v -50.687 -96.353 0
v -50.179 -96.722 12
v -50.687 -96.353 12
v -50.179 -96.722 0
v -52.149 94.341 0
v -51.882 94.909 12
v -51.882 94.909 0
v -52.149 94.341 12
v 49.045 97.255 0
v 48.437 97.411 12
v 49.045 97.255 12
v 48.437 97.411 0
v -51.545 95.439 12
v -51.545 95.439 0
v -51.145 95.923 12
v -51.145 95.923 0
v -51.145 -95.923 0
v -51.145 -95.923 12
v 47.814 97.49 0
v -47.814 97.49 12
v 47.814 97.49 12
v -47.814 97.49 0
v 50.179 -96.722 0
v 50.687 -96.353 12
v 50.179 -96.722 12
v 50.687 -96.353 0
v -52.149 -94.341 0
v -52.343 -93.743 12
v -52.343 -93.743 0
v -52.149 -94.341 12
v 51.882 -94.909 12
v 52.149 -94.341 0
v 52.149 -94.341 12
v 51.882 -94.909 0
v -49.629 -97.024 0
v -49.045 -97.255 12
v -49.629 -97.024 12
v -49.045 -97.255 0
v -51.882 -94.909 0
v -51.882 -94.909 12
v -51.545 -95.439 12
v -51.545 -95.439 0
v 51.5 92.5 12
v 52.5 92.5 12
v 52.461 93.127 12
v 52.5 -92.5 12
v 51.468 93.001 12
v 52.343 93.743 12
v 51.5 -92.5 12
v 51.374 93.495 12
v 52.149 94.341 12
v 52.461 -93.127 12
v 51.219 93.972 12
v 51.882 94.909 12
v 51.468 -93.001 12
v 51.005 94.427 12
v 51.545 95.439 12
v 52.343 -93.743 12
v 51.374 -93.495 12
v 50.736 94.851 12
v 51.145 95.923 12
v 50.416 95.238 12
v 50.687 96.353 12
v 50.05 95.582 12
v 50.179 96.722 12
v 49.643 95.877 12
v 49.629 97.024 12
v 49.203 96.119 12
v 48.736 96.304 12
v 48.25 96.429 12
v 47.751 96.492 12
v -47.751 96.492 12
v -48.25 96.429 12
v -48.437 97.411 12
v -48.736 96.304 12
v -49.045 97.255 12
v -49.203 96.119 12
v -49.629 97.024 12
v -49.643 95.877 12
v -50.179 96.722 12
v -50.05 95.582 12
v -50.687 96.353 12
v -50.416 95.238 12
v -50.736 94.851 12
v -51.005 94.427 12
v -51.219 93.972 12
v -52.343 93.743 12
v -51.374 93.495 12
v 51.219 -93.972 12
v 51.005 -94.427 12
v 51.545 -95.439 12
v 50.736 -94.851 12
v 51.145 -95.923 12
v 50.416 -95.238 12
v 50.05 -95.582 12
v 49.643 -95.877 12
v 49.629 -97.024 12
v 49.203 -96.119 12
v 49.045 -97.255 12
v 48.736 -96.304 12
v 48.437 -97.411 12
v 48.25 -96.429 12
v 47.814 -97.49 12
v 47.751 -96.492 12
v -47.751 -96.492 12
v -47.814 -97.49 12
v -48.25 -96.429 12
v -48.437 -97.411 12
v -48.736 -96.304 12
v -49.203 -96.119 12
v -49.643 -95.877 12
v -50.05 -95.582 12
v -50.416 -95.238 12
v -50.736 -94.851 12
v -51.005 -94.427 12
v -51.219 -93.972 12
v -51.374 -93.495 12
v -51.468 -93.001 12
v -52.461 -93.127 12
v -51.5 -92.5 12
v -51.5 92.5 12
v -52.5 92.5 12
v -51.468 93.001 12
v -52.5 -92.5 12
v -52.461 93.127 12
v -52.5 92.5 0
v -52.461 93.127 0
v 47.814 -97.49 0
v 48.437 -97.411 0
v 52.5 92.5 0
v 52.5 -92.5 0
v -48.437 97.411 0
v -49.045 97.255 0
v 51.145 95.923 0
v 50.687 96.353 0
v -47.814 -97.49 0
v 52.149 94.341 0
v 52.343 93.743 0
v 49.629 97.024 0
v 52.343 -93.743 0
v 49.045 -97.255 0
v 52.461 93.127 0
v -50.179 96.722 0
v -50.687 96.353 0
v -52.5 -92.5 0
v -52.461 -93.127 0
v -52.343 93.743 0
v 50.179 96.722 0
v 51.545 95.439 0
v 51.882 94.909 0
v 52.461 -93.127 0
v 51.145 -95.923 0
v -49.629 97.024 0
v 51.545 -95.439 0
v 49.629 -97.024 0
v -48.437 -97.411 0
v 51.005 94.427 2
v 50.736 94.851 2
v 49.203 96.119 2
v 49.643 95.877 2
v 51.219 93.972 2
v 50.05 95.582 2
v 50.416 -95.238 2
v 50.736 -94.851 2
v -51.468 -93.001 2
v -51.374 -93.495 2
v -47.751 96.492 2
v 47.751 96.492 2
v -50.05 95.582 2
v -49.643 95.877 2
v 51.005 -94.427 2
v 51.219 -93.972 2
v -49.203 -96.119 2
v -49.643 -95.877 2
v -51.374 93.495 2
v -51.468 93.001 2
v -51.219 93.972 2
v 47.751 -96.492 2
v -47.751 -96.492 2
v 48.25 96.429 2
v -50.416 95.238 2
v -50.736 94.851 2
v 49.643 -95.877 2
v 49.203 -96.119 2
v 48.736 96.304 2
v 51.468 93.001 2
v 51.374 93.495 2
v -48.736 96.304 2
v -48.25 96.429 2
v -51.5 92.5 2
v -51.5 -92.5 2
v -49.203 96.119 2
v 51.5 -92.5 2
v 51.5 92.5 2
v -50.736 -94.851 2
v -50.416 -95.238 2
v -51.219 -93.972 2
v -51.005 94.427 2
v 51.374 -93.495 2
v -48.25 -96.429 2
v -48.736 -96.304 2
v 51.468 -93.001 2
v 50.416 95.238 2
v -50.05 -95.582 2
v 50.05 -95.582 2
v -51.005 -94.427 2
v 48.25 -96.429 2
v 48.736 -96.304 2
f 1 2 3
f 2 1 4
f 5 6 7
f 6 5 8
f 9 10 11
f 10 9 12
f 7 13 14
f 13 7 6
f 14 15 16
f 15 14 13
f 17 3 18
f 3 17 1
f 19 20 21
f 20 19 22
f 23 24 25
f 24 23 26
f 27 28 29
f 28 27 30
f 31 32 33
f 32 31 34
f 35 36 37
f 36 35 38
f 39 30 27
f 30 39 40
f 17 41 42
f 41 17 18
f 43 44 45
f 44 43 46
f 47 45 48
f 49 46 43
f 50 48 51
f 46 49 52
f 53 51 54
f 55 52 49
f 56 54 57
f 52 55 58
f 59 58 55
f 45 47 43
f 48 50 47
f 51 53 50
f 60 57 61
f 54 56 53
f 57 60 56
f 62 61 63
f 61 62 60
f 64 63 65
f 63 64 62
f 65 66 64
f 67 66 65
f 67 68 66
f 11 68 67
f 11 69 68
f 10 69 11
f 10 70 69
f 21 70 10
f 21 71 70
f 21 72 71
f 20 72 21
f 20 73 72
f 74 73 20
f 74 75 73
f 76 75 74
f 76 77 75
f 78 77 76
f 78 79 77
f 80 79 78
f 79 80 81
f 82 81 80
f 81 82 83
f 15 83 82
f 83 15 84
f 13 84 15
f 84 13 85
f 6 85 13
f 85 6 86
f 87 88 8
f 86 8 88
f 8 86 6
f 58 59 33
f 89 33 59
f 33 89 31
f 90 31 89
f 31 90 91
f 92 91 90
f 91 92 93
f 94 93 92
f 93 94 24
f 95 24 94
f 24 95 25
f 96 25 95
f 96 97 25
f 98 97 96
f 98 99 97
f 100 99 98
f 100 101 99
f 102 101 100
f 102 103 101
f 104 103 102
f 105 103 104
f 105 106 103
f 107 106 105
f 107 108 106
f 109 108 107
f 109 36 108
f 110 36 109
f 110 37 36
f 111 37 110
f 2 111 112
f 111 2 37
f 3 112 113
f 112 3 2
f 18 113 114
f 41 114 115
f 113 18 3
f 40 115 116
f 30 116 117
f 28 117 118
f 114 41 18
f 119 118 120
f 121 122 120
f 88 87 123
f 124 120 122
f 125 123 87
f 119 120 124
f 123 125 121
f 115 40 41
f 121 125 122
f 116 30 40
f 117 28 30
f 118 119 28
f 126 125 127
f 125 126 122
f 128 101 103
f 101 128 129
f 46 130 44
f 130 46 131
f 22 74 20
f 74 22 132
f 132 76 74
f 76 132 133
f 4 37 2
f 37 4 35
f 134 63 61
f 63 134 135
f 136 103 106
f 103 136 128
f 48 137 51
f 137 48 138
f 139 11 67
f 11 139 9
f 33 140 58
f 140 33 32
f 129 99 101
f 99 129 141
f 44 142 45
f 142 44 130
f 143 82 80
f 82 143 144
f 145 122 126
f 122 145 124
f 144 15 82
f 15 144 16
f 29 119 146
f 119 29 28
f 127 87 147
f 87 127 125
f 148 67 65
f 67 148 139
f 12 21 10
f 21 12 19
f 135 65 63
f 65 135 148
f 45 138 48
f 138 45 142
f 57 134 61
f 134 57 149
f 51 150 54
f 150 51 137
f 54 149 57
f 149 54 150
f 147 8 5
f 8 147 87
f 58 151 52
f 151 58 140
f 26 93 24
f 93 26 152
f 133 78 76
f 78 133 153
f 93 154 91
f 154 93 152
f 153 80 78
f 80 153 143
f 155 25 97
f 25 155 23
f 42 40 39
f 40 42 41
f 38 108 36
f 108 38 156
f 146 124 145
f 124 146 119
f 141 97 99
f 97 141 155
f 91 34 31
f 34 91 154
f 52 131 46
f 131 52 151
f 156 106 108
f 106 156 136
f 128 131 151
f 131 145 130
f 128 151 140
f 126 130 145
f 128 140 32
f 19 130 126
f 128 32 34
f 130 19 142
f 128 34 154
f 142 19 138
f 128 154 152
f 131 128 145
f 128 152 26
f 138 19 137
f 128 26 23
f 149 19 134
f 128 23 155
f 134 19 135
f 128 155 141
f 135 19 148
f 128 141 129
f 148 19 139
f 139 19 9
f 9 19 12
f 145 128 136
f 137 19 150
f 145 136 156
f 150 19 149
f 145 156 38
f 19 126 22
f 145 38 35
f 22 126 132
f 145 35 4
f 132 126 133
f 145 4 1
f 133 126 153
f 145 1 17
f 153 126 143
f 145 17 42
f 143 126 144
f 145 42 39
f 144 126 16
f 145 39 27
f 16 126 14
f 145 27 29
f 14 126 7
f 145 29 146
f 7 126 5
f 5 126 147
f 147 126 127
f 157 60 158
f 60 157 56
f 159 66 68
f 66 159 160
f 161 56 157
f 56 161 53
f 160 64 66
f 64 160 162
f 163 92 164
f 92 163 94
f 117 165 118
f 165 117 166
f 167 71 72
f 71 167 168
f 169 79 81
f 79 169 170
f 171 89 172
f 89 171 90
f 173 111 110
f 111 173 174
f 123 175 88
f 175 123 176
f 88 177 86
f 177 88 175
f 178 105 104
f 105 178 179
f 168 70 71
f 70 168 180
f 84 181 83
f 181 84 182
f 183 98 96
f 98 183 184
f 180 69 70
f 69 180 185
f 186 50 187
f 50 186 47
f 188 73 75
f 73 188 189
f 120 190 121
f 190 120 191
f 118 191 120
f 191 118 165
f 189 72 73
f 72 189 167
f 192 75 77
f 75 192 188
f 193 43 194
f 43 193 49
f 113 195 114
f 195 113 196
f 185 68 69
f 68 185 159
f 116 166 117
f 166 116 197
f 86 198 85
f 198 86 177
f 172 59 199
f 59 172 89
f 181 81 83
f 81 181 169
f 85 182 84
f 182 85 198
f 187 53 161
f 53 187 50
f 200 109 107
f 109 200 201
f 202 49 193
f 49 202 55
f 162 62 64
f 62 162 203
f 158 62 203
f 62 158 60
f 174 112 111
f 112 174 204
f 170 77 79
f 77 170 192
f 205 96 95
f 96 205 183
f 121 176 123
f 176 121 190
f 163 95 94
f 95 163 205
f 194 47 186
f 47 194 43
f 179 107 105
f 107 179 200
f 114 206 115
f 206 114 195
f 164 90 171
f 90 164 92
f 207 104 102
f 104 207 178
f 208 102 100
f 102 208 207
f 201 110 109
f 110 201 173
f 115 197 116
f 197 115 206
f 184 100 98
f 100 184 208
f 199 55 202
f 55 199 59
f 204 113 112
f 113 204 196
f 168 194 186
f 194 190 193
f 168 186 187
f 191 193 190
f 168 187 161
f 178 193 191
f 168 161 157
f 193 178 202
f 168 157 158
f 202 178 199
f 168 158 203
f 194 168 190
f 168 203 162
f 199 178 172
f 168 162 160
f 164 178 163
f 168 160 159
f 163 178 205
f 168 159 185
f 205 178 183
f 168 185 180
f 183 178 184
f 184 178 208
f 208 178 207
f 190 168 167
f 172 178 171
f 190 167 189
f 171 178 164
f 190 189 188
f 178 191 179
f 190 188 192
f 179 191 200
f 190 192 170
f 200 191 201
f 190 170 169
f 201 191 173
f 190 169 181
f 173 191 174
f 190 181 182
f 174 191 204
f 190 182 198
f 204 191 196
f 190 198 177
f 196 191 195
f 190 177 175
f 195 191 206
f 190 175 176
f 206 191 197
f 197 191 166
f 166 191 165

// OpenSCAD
$fn = 50;


difference() {
	union() {
		hull() {
			translate(v = [-47.5000000000, 92.5000000000, 0]) {
				cylinder(h = 12, r = 5);
			}
			translate(v = [47.5000000000, 92.5000000000, 0]) {
				cylinder(h = 12, r = 5);
			}
			translate(v = [-47.5000000000, -92.5000000000, 0]) {
				cylinder(h = 12, r = 5);
			}
			translate(v = [47.5000000000, -92.5000000000, 0]) {
				cylinder(h = 12, r = 5);
			}
		}
	}
	union() {
		translate(v = [0, 0, 2]) {
			hull() {
				translate(v = [-47.5000000000, 92.5000000000, 0]) {
					cylinder(h = 10, r = 4);
				}
				translate(v = [47.5000000000, 92.5000000000, 0]) {
					cylinder(h = 10, r = 4);
				}
				translate(v = [-47.5000000000, -92.5000000000, 0]) {
					cylinder(h = 10, r = 4);
				}
				translate(v = [47.5000000000, -92.5000000000, 0]) {
					cylinder(h = 10, r = 4);
				}
			}
		}
	}
}
